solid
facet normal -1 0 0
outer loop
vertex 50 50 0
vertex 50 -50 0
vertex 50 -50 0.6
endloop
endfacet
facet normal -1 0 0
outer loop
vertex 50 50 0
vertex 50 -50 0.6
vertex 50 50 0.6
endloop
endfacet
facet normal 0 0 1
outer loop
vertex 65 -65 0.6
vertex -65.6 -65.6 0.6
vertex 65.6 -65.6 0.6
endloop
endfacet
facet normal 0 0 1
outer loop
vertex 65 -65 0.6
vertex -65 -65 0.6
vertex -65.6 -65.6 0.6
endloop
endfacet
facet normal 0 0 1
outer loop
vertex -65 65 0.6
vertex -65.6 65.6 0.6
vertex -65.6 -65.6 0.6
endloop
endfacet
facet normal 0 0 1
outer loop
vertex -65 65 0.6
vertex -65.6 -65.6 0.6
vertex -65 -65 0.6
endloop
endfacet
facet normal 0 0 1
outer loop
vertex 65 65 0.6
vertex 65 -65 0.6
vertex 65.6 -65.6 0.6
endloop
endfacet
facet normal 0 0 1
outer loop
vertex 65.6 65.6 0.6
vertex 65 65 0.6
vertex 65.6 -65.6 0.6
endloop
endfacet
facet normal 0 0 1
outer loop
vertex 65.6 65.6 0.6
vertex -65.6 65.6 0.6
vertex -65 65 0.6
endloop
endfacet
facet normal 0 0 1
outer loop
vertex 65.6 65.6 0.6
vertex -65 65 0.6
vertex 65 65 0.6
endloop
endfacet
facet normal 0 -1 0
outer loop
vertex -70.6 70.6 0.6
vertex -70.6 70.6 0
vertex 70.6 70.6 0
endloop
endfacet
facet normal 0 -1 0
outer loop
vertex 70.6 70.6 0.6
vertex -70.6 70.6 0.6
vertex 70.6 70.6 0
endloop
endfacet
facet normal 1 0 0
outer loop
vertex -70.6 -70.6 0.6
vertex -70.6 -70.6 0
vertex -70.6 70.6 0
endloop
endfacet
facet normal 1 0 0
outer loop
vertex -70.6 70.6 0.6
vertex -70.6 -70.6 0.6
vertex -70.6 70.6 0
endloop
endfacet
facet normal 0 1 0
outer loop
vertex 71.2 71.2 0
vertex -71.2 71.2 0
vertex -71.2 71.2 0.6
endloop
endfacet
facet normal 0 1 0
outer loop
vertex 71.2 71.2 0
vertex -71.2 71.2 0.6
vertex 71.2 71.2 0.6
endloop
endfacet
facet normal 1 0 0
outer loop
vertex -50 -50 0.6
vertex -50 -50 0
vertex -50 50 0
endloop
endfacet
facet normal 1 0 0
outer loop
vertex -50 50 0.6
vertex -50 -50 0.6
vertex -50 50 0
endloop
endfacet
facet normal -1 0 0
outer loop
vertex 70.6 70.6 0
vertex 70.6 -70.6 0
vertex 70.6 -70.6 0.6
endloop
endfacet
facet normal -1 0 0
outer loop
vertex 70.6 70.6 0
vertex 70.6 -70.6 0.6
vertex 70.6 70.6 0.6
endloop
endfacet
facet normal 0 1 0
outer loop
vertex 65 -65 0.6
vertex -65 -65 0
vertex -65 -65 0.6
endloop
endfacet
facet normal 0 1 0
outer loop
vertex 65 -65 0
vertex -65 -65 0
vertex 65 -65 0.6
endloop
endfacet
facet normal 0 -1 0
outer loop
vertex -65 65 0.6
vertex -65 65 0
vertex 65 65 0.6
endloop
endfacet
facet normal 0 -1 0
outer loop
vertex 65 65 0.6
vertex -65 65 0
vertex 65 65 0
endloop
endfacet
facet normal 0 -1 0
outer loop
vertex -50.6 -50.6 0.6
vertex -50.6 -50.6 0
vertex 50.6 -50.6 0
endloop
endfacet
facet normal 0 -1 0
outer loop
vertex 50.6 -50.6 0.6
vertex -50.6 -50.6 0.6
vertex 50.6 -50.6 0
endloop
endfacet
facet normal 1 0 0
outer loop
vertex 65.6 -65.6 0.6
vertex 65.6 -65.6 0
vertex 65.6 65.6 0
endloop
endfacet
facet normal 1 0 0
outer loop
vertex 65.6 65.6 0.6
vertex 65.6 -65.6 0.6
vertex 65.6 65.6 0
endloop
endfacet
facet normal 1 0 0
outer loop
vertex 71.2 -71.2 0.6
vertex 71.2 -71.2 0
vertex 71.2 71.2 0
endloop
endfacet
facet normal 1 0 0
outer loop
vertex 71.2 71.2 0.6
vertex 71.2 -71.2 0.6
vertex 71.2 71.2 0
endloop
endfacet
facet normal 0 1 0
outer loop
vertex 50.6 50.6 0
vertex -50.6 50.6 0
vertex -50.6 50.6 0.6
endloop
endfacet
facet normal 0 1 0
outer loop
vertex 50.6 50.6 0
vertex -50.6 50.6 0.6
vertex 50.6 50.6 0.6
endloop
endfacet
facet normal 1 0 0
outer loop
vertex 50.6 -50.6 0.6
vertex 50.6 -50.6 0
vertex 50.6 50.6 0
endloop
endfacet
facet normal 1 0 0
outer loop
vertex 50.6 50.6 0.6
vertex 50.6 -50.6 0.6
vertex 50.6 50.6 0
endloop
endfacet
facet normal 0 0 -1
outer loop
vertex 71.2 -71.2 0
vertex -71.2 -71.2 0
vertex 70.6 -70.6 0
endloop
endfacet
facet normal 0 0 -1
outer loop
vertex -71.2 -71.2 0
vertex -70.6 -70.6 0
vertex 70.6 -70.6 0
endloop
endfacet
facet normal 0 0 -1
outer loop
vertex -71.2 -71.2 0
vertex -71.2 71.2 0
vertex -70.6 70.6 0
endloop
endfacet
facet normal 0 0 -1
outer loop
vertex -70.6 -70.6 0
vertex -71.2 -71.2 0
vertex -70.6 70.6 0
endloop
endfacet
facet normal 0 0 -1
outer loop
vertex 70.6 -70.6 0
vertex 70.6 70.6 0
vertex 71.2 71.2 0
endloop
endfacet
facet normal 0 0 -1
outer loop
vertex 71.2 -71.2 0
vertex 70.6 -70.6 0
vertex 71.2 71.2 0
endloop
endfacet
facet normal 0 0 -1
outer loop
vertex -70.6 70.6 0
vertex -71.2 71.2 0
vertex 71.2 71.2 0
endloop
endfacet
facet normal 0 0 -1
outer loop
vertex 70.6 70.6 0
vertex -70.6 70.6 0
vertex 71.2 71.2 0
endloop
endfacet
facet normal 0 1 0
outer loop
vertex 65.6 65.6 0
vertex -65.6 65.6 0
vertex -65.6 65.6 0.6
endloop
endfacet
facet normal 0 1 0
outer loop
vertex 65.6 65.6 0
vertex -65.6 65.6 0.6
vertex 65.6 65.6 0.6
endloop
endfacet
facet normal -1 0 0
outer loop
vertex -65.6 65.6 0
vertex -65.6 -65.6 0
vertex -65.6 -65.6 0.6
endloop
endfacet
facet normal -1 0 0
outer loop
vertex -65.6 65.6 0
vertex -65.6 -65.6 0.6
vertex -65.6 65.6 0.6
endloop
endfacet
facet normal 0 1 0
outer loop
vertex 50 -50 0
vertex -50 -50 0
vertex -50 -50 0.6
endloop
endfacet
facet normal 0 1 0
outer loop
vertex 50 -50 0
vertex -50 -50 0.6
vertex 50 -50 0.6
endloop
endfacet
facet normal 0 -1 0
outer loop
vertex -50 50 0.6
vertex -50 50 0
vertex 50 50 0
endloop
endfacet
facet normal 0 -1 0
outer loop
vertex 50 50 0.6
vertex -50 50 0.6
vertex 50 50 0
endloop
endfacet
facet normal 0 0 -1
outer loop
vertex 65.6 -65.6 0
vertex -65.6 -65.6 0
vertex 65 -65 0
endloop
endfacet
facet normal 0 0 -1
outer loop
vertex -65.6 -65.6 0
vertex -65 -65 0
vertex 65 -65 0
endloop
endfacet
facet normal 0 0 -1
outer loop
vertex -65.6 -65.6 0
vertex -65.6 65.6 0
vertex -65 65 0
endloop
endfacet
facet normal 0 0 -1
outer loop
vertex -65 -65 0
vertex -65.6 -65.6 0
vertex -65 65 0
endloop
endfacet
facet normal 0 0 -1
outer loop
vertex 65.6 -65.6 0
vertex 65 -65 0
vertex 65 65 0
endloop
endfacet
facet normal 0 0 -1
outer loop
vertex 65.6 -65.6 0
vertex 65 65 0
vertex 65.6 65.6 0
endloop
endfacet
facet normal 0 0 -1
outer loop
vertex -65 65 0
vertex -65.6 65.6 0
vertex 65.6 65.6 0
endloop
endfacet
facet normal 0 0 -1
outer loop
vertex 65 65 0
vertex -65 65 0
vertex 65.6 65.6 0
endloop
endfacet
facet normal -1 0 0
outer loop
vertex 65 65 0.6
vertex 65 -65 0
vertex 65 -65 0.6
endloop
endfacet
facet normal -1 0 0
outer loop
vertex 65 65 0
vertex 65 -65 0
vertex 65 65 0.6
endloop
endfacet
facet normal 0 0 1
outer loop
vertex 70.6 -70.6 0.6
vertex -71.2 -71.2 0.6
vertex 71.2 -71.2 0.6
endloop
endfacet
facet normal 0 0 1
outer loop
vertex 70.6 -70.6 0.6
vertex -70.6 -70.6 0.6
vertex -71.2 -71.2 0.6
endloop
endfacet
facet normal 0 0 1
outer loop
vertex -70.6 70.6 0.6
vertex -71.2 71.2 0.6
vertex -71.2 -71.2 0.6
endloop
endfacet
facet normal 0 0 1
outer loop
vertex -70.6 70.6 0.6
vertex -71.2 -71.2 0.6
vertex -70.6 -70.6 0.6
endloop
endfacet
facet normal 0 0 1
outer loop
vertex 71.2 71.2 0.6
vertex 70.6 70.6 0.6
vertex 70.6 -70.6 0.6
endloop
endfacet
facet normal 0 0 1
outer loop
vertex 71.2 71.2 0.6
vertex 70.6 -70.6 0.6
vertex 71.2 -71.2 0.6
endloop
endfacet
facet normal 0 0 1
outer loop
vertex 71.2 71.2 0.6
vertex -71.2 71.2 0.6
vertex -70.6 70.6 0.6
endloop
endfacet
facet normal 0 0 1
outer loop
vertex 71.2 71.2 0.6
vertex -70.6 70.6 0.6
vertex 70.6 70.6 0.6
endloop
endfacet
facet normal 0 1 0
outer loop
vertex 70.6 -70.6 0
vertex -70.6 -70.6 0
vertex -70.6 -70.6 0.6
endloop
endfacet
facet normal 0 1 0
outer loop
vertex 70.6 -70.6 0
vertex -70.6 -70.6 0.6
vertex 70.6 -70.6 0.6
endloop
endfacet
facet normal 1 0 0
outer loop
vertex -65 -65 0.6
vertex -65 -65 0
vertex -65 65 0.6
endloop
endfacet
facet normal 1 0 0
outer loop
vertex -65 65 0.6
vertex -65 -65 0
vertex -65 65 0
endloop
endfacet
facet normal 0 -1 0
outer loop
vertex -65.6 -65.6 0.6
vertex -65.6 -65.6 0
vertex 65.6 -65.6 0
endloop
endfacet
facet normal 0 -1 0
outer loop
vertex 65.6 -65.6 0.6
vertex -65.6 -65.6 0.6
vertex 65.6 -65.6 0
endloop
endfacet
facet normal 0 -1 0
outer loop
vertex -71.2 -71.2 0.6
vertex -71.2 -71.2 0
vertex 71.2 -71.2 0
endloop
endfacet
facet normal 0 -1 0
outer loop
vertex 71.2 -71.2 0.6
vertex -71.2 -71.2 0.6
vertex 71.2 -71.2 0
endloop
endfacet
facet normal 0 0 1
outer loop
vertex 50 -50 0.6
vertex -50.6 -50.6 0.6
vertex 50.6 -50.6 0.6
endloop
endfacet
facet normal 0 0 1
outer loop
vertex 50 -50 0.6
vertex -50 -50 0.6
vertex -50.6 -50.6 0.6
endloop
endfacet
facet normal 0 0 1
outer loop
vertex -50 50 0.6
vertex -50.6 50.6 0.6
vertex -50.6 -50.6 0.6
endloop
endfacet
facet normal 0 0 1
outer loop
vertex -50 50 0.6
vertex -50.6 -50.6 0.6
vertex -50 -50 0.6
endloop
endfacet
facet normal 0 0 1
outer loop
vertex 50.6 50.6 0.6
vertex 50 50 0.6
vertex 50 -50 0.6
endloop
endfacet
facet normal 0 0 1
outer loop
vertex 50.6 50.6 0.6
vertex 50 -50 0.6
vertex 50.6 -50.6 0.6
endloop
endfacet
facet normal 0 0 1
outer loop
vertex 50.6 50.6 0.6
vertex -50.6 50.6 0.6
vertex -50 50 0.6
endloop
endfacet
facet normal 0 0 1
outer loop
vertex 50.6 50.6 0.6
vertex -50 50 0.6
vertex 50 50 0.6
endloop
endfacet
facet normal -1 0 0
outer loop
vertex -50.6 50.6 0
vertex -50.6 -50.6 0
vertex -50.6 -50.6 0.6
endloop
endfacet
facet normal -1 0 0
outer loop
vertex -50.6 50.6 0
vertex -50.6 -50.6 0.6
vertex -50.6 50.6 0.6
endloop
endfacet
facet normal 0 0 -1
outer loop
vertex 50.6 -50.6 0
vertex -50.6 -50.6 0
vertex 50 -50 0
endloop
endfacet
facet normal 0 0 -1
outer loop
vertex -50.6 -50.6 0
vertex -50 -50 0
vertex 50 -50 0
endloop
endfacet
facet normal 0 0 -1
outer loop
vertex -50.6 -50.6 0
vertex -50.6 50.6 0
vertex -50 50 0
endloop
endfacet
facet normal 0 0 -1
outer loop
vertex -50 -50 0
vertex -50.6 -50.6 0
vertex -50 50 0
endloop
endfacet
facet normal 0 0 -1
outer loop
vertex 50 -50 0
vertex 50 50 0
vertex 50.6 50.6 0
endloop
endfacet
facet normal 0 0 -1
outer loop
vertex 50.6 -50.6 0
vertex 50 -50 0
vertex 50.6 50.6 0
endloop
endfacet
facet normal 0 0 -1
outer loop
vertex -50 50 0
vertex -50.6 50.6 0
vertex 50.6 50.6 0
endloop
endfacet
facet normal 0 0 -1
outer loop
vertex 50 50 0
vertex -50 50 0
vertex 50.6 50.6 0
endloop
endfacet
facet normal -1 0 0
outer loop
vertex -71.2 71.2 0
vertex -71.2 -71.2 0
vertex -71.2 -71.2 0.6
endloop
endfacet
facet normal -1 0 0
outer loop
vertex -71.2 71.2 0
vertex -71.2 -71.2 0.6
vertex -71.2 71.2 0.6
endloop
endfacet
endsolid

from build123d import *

# Parameters (mm, degrees)
F0_W     = 142.4
F0_H     = 142.4
F0_W_2   = 141.2
F0_H_2   = 141.2
F1_DEPTH = 0.6
F0_W_3   = 101.2
F0_H_3   = 101.2
F0_W_4   = 100
F0_H_4   = 100
F0_W_5   = 131.2
F0_H_5   = 131.2
F0_W_6   = 130
F0_H_6   = 130


with BuildPart() as f1:
    # F0 (on Top) → F1 (new body)
    with BuildSketch(Plane.XY):
        Rectangle(F0_W, F0_H)
        Rectangle(F0_W_2, F0_H_2, mode=Mode.SUBTRACT)
    extrude(amount=F1_DEPTH)


with BuildPart() as f1b:
    # F0 (on Top) → F1, piece 2 (new body)
    with BuildSketch(Plane.XY):
        Rectangle(F0_W_3, F0_H_3)
        Rectangle(F0_W_4, F0_H_4, mode=Mode.SUBTRACT)
    extrude(amount=F1_DEPTH)


with BuildPart() as f1c:
    # F0 (on Top) → F1, piece 3 (new body)
    with BuildSketch(Plane.XY):
        Rectangle(F0_W_5, F0_H_5)
        Rectangle(F0_W_6, F0_H_6, mode=Mode.SUBTRACT)
    extrude(amount=F1_DEPTH)


solid = Compound([f1.part, f1b.part, f1c.part])
